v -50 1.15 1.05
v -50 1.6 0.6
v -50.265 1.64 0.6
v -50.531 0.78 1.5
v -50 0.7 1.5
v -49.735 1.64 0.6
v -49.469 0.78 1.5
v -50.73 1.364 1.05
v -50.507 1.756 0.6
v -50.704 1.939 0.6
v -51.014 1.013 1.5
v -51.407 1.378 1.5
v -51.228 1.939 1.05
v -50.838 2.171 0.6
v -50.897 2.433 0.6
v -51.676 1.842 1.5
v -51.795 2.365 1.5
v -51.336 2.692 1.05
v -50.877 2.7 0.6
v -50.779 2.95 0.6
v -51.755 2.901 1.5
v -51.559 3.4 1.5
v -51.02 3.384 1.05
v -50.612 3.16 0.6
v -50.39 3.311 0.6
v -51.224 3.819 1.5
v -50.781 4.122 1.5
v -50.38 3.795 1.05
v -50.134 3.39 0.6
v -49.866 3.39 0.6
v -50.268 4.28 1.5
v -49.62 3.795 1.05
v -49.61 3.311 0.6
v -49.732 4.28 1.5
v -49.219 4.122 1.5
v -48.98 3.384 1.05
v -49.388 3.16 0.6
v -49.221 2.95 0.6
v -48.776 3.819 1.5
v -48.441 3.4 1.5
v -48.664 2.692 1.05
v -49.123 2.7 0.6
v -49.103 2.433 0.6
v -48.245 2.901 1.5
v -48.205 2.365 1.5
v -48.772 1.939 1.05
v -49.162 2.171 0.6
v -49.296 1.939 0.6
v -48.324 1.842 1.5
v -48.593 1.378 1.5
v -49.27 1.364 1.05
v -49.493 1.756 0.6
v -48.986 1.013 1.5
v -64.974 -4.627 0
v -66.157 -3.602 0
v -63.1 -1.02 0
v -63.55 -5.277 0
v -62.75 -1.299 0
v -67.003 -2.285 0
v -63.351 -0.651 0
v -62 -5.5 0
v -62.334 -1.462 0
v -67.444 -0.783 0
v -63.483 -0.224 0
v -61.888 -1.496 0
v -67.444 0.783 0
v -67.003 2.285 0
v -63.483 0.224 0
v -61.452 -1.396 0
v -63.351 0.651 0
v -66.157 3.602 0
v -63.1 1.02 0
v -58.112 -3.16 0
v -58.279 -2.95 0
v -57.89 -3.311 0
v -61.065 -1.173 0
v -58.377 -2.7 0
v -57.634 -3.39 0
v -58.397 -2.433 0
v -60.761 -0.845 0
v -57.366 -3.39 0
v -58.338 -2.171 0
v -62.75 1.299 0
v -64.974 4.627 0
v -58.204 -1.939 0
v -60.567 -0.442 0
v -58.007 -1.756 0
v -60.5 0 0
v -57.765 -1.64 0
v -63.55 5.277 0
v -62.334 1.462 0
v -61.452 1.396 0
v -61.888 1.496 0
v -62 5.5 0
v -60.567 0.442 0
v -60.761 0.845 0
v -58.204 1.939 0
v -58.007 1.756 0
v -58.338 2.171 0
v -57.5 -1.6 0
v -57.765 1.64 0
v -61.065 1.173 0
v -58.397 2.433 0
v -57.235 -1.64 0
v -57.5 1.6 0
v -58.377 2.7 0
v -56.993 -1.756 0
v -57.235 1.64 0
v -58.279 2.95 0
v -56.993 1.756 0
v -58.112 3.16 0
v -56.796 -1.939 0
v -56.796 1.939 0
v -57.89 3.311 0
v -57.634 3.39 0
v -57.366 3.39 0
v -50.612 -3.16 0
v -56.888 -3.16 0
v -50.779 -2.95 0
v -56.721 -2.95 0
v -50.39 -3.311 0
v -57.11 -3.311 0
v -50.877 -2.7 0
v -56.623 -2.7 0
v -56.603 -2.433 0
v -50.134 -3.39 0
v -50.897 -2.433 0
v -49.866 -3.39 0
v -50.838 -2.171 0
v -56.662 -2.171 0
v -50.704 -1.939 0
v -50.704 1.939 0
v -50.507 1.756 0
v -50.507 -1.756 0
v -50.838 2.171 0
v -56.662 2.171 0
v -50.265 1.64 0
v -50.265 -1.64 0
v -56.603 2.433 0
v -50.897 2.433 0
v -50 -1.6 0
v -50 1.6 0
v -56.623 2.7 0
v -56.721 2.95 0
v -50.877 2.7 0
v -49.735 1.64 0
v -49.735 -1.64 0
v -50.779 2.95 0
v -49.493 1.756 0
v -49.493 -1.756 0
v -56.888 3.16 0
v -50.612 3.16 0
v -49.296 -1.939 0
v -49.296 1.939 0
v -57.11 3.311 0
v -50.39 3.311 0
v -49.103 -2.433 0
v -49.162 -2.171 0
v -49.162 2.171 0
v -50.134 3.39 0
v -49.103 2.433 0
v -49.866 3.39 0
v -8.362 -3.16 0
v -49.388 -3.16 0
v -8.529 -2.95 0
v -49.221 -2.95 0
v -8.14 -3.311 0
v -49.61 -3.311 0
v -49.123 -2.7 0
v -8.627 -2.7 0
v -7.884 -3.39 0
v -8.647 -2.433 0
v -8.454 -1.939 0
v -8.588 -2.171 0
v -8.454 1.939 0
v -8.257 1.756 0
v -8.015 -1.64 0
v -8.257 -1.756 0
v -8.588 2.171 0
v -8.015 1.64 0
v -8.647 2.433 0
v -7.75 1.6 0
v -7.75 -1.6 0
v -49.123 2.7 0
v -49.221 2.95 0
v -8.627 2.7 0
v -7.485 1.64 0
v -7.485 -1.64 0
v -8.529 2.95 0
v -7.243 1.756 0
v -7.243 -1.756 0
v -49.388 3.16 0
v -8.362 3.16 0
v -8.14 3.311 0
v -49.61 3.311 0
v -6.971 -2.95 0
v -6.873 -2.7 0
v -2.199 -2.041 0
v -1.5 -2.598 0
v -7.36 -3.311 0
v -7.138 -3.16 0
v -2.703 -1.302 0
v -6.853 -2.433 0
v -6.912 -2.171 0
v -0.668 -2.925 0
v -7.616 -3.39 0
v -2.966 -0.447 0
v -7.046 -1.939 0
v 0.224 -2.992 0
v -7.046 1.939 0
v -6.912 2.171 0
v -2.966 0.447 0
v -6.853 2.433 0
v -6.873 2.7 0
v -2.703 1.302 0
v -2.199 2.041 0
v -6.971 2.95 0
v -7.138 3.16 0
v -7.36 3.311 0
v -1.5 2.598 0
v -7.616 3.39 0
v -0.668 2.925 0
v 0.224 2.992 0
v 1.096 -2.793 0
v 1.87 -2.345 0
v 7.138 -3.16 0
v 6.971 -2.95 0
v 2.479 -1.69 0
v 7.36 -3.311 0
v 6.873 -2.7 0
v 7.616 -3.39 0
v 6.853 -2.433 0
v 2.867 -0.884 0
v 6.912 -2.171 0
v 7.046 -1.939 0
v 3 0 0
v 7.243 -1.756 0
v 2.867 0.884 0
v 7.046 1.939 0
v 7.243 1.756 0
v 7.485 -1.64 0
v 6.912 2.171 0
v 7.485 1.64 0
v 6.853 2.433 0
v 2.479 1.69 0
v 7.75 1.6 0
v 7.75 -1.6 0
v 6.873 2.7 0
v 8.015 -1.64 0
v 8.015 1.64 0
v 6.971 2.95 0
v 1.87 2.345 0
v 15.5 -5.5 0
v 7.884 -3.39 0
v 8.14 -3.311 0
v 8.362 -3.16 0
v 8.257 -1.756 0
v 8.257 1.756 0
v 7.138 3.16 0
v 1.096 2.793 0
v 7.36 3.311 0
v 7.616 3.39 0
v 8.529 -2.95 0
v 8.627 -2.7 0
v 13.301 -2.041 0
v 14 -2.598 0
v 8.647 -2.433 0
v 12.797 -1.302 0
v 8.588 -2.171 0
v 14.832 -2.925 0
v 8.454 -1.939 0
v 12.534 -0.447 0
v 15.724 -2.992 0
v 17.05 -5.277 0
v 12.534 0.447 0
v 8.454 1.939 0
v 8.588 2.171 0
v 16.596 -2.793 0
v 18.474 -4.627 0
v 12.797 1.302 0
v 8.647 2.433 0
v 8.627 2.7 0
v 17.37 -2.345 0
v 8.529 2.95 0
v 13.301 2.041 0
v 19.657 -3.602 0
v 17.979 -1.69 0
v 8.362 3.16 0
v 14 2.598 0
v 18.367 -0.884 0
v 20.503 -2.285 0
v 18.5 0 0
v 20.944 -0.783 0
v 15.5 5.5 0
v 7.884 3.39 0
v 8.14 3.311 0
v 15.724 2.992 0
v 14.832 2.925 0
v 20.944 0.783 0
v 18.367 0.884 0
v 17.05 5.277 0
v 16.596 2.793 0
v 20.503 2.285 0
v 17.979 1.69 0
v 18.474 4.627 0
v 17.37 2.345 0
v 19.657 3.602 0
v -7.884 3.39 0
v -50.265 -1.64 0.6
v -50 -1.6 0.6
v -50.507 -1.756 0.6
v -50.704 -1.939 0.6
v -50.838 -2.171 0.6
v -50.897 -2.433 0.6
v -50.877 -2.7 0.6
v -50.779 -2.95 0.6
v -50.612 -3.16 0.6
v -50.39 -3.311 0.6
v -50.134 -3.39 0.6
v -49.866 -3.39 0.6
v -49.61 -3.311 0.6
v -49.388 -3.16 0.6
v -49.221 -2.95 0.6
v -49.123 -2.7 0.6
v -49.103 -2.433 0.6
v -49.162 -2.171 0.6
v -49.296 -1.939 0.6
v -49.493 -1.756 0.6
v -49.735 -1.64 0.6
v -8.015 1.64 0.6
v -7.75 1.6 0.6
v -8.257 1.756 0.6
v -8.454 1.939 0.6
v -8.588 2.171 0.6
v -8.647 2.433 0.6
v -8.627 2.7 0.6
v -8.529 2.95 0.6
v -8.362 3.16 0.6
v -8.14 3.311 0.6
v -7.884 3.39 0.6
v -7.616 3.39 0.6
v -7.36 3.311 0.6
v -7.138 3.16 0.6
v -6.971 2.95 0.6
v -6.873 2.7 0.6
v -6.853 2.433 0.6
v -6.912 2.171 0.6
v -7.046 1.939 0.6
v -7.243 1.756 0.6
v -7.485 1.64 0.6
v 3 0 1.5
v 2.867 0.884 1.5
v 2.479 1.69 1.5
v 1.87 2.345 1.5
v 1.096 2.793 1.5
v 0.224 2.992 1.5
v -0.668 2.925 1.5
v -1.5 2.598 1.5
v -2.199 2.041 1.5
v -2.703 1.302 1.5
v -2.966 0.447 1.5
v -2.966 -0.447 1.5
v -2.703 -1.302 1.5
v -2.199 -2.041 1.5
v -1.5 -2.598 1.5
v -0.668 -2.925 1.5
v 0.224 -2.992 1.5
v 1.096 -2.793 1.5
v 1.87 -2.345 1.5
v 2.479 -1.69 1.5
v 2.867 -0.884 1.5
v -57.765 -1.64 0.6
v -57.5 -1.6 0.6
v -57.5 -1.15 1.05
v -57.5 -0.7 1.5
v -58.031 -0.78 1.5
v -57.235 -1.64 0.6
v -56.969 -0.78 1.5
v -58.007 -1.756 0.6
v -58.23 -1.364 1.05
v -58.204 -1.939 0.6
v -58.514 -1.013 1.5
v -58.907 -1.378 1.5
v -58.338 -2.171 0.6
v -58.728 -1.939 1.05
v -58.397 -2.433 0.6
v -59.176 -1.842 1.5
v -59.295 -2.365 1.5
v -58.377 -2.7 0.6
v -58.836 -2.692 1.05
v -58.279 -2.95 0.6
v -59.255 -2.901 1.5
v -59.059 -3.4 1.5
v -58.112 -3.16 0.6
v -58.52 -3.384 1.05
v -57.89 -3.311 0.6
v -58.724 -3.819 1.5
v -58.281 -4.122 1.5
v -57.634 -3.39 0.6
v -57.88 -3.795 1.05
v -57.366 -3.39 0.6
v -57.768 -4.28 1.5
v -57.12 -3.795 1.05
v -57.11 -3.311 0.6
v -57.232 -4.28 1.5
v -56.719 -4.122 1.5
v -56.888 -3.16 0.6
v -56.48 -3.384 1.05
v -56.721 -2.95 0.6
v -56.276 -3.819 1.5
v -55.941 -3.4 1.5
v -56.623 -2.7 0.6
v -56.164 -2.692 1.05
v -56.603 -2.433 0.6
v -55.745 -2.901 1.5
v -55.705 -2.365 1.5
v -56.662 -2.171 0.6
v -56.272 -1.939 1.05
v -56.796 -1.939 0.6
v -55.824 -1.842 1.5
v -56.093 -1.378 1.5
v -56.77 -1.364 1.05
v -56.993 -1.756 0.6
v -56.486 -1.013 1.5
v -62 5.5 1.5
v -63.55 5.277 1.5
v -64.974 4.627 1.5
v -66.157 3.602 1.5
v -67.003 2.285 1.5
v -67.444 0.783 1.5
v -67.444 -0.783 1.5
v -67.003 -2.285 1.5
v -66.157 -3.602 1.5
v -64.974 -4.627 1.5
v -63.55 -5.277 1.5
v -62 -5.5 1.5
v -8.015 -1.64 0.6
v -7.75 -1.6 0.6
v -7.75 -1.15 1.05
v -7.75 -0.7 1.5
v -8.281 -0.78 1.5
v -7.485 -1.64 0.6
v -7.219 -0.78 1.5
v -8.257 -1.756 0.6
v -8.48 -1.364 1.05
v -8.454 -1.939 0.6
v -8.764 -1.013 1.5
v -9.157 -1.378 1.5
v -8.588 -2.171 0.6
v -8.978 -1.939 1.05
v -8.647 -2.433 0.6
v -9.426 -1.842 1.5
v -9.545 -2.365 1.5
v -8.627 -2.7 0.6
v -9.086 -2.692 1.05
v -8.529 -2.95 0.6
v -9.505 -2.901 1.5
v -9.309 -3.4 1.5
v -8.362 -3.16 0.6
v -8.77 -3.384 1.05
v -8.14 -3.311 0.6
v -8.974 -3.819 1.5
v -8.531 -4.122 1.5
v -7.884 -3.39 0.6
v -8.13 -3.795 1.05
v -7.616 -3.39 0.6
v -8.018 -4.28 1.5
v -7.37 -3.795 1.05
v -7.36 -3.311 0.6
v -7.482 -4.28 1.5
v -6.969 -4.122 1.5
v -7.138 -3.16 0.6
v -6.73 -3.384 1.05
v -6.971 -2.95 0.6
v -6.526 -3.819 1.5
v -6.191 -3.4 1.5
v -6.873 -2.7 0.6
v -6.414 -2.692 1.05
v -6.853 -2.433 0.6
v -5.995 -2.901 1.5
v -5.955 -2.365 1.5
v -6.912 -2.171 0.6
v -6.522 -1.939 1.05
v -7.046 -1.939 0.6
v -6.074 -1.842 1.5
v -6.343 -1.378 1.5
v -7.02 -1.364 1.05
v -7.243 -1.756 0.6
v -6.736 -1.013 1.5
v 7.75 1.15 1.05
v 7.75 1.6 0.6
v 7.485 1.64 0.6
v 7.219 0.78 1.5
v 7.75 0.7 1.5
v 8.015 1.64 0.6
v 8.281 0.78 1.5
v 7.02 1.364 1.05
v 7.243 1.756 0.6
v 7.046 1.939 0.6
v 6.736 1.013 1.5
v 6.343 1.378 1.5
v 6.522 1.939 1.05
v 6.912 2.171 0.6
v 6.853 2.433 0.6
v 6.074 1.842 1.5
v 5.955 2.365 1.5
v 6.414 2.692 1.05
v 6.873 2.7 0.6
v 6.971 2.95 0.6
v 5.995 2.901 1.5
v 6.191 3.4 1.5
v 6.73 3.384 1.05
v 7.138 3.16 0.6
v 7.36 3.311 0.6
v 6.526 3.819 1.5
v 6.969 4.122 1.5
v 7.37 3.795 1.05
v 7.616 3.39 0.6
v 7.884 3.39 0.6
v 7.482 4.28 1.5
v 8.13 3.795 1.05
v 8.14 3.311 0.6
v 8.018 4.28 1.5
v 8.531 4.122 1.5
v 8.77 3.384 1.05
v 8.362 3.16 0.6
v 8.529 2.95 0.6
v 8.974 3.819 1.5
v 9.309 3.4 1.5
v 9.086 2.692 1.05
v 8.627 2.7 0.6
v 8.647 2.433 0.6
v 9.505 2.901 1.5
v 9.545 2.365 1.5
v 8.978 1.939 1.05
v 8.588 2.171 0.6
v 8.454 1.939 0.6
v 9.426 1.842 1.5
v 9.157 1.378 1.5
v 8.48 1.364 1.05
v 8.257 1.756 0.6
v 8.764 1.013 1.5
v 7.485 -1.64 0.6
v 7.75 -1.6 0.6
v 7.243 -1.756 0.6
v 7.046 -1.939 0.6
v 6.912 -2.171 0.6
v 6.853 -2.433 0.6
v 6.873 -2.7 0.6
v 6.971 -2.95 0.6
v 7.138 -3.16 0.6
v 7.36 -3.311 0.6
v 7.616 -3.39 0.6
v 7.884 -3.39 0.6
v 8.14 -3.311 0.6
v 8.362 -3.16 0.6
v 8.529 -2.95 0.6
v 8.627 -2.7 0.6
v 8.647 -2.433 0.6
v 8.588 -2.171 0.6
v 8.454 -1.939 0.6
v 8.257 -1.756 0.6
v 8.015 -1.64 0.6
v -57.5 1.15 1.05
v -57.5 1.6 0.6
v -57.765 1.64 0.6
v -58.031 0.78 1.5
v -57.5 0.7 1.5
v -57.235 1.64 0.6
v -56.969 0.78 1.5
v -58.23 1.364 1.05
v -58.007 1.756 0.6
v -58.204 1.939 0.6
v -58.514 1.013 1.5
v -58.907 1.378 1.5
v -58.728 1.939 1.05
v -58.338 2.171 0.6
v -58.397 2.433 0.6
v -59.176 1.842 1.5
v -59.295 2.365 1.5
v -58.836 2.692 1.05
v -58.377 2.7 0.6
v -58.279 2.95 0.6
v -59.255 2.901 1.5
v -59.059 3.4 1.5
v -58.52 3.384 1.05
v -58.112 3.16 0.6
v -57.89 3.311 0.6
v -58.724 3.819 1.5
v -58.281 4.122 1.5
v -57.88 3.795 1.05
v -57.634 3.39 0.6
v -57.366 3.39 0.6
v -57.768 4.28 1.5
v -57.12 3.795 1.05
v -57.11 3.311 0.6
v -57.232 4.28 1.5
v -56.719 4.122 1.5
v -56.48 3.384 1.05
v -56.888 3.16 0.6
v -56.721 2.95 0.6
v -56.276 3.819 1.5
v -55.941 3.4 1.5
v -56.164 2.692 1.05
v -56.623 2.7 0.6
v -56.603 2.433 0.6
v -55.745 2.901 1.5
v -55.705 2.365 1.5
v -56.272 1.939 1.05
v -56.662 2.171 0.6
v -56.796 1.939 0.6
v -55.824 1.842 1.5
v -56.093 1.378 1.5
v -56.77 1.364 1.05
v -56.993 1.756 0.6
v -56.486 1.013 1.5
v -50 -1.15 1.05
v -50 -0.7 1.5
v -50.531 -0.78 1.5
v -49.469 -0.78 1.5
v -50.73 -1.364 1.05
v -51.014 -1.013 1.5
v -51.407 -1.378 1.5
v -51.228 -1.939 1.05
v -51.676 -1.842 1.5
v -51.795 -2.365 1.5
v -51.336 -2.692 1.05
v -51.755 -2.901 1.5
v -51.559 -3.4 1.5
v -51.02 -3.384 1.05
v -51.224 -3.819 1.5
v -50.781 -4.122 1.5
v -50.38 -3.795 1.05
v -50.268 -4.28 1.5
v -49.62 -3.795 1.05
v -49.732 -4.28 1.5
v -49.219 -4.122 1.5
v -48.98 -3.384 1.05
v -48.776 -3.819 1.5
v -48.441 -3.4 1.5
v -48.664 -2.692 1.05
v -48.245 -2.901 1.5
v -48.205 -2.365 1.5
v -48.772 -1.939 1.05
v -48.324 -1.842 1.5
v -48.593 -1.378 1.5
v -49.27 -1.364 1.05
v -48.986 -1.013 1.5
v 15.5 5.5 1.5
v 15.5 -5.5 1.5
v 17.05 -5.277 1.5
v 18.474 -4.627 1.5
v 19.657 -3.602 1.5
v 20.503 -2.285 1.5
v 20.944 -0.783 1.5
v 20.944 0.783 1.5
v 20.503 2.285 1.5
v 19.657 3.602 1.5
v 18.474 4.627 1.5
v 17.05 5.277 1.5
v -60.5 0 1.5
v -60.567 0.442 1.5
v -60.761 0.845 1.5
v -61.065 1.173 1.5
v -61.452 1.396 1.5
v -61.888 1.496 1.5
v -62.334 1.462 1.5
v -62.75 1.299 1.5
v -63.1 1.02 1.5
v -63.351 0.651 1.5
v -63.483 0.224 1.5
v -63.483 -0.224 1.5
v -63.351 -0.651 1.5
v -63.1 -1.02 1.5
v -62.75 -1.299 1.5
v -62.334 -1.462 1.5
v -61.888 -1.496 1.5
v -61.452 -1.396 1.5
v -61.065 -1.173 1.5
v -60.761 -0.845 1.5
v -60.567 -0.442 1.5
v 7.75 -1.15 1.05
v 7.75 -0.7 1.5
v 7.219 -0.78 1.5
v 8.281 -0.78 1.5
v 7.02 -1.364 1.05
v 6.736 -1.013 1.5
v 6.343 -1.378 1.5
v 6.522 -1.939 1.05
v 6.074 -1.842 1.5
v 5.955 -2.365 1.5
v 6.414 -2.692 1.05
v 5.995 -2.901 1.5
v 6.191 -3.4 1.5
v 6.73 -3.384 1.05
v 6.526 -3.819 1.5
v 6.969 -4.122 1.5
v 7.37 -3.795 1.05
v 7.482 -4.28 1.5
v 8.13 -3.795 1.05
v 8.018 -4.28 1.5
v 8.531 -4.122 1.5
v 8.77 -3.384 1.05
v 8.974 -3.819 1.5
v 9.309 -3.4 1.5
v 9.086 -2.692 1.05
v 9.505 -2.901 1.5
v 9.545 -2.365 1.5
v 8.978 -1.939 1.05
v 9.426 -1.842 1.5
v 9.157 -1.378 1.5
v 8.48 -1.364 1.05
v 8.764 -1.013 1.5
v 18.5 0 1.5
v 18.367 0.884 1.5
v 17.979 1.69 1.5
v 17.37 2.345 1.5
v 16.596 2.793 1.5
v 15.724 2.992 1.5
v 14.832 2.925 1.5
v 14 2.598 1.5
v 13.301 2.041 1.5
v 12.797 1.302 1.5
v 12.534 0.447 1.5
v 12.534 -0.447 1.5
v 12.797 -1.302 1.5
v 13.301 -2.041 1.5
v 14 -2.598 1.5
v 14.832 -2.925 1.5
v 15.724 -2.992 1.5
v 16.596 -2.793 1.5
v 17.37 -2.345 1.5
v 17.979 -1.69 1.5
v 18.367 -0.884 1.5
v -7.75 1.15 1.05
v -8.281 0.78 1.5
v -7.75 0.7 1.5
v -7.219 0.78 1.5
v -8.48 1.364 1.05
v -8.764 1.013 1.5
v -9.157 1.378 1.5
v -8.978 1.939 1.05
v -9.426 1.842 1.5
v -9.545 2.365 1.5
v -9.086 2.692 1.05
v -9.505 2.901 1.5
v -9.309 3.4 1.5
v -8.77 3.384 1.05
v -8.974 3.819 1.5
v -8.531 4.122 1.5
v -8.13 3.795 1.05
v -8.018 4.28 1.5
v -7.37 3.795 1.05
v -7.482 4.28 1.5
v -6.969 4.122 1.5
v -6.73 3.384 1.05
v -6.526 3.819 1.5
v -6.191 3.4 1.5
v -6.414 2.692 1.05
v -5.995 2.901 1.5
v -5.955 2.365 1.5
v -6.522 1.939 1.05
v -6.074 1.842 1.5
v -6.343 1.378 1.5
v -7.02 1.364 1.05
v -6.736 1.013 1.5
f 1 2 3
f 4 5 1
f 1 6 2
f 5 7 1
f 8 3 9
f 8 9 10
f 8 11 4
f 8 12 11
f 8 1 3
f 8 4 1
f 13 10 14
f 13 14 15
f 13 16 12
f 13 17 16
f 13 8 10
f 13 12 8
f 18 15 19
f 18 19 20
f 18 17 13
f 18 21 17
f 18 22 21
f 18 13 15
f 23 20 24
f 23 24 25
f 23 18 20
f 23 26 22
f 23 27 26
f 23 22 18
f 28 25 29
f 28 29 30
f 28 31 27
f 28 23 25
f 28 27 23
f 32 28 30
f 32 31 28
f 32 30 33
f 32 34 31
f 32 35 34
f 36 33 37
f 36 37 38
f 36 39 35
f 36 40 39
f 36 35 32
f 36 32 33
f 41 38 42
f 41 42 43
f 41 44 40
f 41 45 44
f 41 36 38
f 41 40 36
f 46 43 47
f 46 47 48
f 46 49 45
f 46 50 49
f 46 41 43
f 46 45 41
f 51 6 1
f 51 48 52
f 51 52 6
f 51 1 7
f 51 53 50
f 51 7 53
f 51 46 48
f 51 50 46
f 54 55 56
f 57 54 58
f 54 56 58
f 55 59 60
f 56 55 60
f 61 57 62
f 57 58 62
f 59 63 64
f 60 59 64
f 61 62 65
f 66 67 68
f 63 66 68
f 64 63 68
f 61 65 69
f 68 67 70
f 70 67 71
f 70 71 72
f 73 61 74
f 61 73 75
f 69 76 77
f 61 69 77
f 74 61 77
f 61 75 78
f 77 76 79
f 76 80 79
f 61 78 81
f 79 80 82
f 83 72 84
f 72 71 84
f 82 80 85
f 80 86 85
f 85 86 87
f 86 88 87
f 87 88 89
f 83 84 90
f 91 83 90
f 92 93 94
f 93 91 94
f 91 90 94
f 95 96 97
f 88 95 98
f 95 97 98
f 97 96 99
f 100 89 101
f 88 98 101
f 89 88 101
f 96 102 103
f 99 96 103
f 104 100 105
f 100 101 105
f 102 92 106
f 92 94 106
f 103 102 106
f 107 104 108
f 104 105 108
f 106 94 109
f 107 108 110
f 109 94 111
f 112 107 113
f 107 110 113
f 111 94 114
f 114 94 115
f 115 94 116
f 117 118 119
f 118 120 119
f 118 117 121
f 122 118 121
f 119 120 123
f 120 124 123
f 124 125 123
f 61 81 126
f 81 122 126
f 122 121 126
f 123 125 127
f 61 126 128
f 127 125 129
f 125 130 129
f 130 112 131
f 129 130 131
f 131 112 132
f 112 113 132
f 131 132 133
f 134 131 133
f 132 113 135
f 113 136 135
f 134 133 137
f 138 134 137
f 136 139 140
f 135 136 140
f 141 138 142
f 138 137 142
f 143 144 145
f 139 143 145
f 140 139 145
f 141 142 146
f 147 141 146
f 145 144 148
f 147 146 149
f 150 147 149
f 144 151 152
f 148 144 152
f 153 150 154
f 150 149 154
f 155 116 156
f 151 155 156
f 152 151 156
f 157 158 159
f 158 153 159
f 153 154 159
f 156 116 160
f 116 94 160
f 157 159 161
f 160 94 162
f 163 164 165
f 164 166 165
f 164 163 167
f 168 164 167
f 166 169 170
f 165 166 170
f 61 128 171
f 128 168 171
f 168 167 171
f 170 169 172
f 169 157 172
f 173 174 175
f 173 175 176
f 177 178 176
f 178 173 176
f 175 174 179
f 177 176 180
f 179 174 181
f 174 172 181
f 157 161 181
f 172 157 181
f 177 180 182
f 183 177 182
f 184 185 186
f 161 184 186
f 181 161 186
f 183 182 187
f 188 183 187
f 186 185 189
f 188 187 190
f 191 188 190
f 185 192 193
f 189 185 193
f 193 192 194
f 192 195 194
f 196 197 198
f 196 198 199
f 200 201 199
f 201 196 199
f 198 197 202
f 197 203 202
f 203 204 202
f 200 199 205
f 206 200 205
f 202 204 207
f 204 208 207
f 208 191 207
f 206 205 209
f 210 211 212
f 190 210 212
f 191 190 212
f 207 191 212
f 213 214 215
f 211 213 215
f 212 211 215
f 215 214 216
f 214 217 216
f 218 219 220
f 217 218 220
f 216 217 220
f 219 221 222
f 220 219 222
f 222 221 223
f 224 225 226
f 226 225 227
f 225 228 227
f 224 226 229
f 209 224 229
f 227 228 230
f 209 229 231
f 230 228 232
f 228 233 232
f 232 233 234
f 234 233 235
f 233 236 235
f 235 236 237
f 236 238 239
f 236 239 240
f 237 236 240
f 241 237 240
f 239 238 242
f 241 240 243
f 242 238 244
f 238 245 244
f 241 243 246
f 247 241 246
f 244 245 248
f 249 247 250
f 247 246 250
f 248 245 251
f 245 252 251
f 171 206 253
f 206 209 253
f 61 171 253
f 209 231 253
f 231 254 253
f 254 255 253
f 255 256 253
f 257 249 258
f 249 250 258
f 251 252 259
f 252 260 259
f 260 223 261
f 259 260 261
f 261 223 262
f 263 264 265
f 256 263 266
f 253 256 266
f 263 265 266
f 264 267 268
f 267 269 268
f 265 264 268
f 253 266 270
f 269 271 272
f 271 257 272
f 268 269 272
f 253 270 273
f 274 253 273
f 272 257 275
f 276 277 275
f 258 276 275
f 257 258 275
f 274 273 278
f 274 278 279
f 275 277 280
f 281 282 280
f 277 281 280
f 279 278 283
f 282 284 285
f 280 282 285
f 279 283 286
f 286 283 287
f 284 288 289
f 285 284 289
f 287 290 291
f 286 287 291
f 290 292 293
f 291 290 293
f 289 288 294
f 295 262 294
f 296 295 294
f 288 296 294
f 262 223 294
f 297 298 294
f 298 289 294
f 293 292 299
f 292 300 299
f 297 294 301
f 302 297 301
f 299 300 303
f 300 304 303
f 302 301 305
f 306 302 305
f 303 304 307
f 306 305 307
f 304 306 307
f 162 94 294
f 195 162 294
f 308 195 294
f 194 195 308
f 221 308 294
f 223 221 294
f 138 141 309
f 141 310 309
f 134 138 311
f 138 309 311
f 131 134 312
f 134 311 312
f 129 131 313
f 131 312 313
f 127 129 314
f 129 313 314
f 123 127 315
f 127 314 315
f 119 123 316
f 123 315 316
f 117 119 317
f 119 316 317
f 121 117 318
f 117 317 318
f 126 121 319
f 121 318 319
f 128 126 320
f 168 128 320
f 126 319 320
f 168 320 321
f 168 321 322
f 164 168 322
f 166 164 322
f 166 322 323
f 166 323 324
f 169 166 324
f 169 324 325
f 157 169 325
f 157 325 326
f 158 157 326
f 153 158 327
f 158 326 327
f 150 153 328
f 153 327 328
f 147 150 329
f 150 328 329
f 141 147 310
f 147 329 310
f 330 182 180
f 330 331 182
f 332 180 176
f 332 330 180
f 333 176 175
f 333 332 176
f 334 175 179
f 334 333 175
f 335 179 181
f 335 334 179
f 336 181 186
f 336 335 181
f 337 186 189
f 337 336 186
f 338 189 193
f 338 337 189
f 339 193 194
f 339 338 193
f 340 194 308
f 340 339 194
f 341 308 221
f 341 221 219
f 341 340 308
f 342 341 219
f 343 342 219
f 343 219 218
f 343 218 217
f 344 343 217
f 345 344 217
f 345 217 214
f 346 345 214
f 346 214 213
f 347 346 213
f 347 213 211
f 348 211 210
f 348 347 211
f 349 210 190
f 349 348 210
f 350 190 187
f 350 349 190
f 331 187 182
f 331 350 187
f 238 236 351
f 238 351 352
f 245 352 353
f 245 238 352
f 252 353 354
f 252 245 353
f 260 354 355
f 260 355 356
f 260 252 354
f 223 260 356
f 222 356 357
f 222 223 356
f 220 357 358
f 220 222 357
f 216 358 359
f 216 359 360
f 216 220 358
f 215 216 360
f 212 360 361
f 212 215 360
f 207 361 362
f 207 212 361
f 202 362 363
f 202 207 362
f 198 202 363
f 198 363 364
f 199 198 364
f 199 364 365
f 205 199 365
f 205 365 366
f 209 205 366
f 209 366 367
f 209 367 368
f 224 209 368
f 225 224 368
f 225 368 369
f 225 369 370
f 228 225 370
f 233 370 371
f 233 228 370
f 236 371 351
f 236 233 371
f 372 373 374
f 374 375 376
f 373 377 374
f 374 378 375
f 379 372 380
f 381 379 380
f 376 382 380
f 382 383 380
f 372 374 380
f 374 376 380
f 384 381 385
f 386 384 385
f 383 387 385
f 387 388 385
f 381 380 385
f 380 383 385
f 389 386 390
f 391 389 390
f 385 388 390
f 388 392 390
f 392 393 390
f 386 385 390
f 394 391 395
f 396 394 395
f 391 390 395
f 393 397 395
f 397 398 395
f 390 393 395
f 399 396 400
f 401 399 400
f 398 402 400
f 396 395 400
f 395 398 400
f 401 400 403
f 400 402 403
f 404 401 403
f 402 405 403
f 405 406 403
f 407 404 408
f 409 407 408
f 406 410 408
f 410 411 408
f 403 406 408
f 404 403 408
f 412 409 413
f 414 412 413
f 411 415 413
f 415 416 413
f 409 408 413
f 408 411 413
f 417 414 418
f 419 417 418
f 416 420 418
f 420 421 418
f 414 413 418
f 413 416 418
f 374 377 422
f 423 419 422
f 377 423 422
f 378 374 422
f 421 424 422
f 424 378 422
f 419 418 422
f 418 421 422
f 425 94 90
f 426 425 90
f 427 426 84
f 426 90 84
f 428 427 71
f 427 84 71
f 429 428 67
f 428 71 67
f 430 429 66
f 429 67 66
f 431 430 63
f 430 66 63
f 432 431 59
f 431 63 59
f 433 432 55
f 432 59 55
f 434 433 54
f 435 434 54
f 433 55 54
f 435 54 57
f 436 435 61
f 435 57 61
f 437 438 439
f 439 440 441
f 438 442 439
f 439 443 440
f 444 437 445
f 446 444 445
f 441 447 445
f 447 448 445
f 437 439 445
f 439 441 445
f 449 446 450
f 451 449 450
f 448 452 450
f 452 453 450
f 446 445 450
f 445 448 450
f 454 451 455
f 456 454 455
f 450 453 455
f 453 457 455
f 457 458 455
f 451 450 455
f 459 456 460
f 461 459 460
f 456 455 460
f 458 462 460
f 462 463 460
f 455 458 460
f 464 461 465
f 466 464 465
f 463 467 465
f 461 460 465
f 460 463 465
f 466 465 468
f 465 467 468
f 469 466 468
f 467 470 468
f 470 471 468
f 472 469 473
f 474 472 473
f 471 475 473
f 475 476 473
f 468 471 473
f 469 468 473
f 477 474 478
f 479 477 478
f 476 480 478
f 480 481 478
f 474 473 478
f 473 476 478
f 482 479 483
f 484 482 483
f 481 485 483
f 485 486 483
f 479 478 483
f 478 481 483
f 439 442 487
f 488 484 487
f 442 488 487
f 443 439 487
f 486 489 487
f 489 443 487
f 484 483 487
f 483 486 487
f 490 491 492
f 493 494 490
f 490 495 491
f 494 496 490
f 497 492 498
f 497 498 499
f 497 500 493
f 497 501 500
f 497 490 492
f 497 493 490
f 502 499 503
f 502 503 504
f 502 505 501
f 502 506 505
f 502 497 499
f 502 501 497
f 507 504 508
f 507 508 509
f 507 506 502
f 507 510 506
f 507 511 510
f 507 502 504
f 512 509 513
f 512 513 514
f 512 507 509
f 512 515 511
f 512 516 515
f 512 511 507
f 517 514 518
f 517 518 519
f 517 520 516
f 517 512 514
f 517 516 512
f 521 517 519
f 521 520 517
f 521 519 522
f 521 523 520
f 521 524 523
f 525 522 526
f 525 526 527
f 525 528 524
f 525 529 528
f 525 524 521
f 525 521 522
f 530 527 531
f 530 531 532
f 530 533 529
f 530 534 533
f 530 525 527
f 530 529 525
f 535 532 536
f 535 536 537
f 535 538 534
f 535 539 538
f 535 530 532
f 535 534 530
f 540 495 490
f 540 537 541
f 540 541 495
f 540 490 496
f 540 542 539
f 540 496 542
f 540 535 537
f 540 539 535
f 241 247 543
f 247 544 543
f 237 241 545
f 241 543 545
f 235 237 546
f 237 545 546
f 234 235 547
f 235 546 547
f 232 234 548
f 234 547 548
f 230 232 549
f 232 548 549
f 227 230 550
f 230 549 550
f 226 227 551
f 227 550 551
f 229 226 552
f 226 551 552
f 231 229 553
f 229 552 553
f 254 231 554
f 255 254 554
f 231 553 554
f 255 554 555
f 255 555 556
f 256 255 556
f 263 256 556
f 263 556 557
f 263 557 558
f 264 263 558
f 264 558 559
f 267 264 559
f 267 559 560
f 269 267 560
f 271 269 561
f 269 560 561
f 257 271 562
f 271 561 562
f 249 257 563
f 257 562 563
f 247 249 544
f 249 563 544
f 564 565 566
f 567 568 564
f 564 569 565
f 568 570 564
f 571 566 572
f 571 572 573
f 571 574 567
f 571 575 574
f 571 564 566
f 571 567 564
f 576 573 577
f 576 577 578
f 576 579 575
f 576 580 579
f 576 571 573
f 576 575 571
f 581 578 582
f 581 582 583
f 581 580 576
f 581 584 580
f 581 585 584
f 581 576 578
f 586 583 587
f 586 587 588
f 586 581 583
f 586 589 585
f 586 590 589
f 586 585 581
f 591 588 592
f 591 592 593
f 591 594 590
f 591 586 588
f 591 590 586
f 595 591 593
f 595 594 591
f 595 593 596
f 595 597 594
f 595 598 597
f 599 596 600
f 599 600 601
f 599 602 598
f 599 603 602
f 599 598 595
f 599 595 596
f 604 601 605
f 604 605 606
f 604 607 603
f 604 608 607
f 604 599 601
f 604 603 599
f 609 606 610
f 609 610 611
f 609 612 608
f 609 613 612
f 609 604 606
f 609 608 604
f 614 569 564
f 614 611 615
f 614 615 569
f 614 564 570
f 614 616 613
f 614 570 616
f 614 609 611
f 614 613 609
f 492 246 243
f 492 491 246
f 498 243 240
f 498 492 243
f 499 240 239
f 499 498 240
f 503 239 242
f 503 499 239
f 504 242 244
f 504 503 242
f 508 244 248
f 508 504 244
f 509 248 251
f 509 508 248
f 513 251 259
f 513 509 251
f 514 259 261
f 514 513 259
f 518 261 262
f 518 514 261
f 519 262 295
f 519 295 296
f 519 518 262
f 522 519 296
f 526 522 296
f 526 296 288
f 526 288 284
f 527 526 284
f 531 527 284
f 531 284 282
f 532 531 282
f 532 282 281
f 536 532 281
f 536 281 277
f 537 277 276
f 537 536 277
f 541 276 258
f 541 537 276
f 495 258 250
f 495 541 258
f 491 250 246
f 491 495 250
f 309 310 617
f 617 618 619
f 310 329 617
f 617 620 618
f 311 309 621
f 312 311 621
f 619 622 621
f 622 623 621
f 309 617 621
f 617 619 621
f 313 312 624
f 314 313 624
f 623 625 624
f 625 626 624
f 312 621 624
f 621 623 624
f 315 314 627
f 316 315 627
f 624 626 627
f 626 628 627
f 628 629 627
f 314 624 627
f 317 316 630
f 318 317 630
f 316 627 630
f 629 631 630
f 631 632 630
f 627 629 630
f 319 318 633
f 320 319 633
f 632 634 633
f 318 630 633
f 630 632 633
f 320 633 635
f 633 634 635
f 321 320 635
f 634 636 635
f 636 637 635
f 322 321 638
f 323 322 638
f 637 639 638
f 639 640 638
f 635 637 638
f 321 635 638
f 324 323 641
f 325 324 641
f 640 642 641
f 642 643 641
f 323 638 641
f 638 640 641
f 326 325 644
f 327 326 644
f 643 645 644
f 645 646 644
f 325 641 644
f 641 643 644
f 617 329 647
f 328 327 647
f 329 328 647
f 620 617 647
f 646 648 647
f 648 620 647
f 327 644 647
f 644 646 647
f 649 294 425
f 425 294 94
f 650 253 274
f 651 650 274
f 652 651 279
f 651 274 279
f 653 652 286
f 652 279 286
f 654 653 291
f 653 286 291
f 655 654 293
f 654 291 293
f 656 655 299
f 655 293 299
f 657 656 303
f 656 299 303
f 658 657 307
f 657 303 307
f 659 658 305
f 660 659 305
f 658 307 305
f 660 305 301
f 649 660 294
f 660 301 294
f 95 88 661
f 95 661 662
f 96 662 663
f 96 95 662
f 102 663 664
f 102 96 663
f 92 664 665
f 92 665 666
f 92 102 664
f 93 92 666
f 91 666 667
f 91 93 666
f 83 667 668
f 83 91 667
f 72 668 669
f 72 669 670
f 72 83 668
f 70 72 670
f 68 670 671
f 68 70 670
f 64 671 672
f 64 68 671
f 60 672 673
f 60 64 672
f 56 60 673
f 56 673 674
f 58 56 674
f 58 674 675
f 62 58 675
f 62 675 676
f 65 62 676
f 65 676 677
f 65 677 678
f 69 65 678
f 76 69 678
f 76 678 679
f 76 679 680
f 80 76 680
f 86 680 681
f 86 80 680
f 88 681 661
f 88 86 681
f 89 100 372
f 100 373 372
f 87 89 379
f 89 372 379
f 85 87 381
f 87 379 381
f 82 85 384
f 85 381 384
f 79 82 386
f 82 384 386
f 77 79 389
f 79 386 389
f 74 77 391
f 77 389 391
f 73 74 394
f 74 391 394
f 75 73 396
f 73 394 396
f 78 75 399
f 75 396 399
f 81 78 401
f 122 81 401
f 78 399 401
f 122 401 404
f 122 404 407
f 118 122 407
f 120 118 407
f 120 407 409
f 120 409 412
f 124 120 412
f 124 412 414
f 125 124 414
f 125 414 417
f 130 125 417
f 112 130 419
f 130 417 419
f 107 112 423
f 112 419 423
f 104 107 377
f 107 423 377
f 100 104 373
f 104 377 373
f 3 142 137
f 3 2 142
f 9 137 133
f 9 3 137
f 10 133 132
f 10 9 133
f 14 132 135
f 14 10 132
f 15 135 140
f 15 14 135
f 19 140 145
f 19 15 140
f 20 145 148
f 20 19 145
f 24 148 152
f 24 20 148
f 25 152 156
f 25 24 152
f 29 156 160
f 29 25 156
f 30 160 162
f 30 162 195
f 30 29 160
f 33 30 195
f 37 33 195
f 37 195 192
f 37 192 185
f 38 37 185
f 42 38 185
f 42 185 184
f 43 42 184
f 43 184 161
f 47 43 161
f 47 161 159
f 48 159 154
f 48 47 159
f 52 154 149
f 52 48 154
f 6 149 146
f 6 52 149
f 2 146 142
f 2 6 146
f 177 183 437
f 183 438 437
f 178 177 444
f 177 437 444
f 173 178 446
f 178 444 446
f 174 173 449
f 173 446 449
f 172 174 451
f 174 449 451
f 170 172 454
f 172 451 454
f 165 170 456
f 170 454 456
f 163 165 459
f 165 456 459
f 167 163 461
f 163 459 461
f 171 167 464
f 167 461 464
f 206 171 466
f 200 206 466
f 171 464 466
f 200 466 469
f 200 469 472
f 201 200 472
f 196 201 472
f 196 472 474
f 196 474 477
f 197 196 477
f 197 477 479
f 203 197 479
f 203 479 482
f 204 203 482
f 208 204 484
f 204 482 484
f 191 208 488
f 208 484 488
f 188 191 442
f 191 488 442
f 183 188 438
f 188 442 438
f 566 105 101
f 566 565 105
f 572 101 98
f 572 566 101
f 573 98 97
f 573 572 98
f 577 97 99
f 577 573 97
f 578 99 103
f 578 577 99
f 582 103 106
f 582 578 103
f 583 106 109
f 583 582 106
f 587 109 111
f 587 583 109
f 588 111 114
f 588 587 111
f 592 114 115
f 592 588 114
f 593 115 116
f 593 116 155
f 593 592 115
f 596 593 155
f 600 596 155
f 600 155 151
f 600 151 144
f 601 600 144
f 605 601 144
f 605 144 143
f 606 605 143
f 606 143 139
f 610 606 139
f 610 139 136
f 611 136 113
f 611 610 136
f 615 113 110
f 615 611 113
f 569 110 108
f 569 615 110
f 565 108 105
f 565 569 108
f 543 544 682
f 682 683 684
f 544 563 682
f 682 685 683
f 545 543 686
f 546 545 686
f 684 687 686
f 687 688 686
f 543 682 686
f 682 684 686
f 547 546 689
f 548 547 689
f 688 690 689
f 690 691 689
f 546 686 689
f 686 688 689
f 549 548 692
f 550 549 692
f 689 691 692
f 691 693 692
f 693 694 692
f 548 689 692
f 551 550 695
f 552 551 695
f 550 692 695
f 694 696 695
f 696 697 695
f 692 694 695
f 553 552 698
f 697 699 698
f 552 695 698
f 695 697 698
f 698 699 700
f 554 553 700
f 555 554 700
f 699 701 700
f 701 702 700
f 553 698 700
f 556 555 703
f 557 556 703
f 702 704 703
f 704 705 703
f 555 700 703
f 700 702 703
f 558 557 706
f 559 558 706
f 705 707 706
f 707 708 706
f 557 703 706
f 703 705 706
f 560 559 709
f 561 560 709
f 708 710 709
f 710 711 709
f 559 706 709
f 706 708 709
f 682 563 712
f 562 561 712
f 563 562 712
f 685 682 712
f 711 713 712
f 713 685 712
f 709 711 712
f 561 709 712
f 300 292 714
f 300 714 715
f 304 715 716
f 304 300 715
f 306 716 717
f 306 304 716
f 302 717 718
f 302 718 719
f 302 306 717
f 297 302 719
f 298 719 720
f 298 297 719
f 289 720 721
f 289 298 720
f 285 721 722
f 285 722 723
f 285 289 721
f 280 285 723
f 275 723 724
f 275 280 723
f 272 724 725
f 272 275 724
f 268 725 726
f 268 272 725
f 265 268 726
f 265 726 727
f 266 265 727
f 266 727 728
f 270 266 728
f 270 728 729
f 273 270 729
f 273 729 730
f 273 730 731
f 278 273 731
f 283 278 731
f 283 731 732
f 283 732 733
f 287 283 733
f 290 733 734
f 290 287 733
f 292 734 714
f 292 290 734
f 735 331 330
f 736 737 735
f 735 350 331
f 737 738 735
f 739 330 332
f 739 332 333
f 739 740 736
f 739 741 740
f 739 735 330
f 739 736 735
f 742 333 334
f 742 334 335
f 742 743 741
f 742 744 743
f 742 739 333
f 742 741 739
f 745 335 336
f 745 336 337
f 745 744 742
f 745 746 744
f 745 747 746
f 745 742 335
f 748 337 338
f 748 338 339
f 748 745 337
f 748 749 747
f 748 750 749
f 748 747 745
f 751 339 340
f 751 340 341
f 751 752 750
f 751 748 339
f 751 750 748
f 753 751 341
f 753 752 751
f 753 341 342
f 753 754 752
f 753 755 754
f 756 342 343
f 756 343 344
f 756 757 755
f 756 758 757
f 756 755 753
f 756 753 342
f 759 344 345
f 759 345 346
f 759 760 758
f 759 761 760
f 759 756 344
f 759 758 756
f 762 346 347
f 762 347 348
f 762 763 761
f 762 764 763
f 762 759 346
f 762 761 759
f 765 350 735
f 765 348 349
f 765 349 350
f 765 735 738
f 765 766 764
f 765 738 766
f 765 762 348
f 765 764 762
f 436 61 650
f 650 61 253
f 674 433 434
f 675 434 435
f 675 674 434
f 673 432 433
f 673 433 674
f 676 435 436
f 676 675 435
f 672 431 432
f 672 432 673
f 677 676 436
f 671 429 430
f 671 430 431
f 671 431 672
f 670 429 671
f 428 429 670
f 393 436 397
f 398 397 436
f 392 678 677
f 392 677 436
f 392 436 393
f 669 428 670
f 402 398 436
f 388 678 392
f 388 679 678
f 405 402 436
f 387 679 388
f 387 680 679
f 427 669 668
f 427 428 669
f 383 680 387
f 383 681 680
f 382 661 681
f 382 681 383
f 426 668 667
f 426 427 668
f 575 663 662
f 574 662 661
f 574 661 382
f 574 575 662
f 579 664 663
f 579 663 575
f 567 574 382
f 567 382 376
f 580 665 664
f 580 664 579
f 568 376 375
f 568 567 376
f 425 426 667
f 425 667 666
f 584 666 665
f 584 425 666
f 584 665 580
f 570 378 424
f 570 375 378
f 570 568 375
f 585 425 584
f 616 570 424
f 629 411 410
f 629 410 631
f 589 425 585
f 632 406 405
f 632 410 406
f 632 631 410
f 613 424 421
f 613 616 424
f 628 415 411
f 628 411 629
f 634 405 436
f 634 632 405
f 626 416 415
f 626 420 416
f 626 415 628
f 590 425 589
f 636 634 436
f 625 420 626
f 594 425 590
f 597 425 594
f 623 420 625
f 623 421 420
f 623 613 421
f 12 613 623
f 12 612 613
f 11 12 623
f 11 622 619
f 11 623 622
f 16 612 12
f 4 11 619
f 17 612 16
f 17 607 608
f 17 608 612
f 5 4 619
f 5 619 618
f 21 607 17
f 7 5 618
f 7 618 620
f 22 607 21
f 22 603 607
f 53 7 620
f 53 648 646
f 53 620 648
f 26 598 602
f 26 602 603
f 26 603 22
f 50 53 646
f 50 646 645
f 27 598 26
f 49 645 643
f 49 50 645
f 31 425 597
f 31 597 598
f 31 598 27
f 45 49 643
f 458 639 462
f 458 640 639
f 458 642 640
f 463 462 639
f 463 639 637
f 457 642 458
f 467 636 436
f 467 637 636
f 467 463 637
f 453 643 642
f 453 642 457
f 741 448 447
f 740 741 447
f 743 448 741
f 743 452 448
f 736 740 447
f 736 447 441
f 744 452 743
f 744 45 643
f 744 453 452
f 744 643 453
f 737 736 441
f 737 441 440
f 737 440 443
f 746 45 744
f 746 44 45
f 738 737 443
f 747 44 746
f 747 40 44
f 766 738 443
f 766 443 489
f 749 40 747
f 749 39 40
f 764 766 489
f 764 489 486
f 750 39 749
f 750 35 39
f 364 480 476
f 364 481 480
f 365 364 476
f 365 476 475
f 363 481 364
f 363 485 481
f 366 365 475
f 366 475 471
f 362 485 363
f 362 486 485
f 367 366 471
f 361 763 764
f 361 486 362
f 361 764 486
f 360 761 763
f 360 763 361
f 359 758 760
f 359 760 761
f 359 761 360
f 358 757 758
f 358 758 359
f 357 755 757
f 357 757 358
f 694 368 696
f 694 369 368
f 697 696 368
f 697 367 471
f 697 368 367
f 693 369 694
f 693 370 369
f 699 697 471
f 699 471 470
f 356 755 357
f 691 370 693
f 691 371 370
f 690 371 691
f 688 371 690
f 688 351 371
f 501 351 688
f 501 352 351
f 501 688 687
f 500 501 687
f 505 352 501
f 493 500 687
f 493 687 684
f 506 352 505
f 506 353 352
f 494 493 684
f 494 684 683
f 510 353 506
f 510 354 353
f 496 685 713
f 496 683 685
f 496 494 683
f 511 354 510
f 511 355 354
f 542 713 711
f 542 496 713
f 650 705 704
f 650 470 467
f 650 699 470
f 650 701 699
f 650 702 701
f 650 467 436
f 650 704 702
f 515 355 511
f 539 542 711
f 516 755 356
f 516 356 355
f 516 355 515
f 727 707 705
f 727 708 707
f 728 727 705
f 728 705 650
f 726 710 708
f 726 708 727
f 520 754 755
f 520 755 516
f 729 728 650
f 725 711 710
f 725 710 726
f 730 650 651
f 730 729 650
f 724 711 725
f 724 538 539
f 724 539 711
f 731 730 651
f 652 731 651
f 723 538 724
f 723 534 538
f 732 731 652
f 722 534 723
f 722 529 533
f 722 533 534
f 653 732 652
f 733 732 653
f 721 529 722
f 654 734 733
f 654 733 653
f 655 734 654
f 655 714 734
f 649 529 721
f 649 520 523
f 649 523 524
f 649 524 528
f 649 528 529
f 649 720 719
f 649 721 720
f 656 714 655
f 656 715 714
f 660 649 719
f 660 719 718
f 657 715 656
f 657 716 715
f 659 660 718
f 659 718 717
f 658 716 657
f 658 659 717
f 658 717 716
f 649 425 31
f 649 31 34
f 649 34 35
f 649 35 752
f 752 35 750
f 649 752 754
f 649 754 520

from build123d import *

# Parameters (mm, degrees)
SKETCH1_R                                    = 1.5
SKETCH1_R_2                                  = 3
BOSS_EXTRUDE1_DEPTH                          = 1.5
CSK_FOR_M1_6_COUNTERSUNK_FLAT_HEAD_S_2_COUNT = 2
CSK_FOR_M1_6_COUNTERSUNK_FLAT_HEAD_S_2_PITCH = 15.5
CSK_FOR_M1_6_COUNTERSUNK_FLAT_HEAD_S_3_COUNT = 2
CSK_FOR_M1_6_COUNTERSUNK_FLAT_HEAD_S_3_PITCH = 65.25
CSK_FOR_M1_6_COUNTERSUNK_FLAT_HEAD_S_4_COUNT = 2
CSK_FOR_M1_6_COUNTERSUNK_FLAT_HEAD_S_4_PITCH = 57.75


with BuildPart() as part:
    # Sketch1 → Boss-Extrude1 (new body)
    with BuildSketch(Plane.XY):
        with BuildLine():
            Line((15.5, 5.5), (-62, 5.5))
            ThreePointArc((-62, 5.5), (-67.5, 0), (-62, -5.5))
            Line((-62, -5.5), (15.5, -5.5))
            ThreePointArc((15.5, -5.5), (21, 0), (15.5, 5.5))
        make_face()
        with Locations((-62, 0)):
            Circle(SKETCH1_R, mode=Mode.SUBTRACT)
        Circle(SKETCH1_R_2, mode=Mode.SUBTRACT)
        with Locations((15.5, 0)):
            Circle(SKETCH1_R_2, mode=Mode.SUBTRACT)
    extrude(amount=BOSS_EXTRUDE1_DEPTH)

    # Sketch2 → CSK for M1.6 Countersunk Flat Head Screw1 (revolve, cut)
    with BuildSketch(Plane(origin=(7.75, 2.5, 1.5), x_dir=(0, -1, 0), z_dir=(1, 0, 0))):
        Polygon((0, 0), (0, 1.5), (0.9, 1.5), (0.9, 0.9), (1.8, 0), align=None)
    csk_for_m1_6_countersunk_flat_head_screw = revolve(axis=Axis((7.75, 2.5, 7.85), (0, 0, -1)), mode=Mode.SUBTRACT)

    # CSK for M1.6 Countersunk Flat Head S 2: CSK for M1.6 Countersunk Flat Head Screw1 ×2
    with Locations(*[(-i * CSK_FOR_M1_6_COUNTERSUNK_FLAT_HEAD_S_2_PITCH, 0, 0) for i in range(1, CSK_FOR_M1_6_COUNTERSUNK_FLAT_HEAD_S_2_COUNT)]):
        add(csk_for_m1_6_countersunk_flat_head_screw, mode=Mode.SUBTRACT)

    # CSK for M1.6 Countersunk Flat Head S 3: CSK for M1.6 Countersunk Flat Head Screw1 ×2
    with Locations(*[(-i * CSK_FOR_M1_6_COUNTERSUNK_FLAT_HEAD_S_3_PITCH, 0, 0) for i in range(1, CSK_FOR_M1_6_COUNTERSUNK_FLAT_HEAD_S_3_COUNT)]):
        add(csk_for_m1_6_countersunk_flat_head_screw, mode=Mode.SUBTRACT)

    # CSK for M1.6 Countersunk Flat Head S 4: CSK for M1.6 Countersunk Flat Head Screw1 ×2
    with Locations(*[(-i * CSK_FOR_M1_6_COUNTERSUNK_FLAT_HEAD_S_4_PITCH, 0, 0) for i in range(1, CSK_FOR_M1_6_COUNTERSUNK_FLAT_HEAD_S_4_COUNT)]):
        add(csk_for_m1_6_countersunk_flat_head_screw, mode=Mode.SUBTRACT)

    # Mirror1: CSK for M1.6 Countersunk Flat Head Screw1 across plane
    add(csk_for_m1_6_countersunk_flat_head_screw.mirror(Plane.ZX), mode=Mode.SUBTRACT)

    # Mirror1 copy 1 sketch → Mirror1 copy 1 (revolve, cut)
    with BuildSketch(Plane(origin=(-7.75, -2.5, 1.5), x_dir=(0, 1, 0), z_dir=(1, 0, 0))):
        Polygon((0, 0), (0, -1.5), (0.9, -1.5), (0.9, -0.9), (1.8, 0), align=None)
    revolve(axis=Axis((-7.75, -2.5, 7.85), (0, 0, 1)), mode=Mode.SUBTRACT)

    # Mirror1 copy 2 sketch → Mirror1 copy 2 (revolve, cut)
    with BuildSketch(Plane(origin=(-57.5, -2.5, 1.5), x_dir=(0, 1, 0), z_dir=(1, 0, 0))):
        Polygon((0, 0), (0, -1.5), (0.9, -1.5), (0.9, -0.9), (1.8, 0), align=None)
    revolve(axis=Axis((-57.5, -2.5, 7.85), (0, 0, 1)), mode=Mode.SUBTRACT)

    # Mirror1 copy 3 sketch → Mirror1 copy 3 (revolve, cut)
    with BuildSketch(Plane(origin=(-50, -2.5, 1.5), x_dir=(0, 1, 0), z_dir=(1, 0, 0))):
        Polygon((0, 0), (0, -1.5), (0.9, -1.5), (0.9, -0.9), (1.8, 0), align=None)
    revolve(axis=Axis((-50, -2.5, 7.85), (0, 0, 1)), mode=Mode.SUBTRACT)


solid = part.part
